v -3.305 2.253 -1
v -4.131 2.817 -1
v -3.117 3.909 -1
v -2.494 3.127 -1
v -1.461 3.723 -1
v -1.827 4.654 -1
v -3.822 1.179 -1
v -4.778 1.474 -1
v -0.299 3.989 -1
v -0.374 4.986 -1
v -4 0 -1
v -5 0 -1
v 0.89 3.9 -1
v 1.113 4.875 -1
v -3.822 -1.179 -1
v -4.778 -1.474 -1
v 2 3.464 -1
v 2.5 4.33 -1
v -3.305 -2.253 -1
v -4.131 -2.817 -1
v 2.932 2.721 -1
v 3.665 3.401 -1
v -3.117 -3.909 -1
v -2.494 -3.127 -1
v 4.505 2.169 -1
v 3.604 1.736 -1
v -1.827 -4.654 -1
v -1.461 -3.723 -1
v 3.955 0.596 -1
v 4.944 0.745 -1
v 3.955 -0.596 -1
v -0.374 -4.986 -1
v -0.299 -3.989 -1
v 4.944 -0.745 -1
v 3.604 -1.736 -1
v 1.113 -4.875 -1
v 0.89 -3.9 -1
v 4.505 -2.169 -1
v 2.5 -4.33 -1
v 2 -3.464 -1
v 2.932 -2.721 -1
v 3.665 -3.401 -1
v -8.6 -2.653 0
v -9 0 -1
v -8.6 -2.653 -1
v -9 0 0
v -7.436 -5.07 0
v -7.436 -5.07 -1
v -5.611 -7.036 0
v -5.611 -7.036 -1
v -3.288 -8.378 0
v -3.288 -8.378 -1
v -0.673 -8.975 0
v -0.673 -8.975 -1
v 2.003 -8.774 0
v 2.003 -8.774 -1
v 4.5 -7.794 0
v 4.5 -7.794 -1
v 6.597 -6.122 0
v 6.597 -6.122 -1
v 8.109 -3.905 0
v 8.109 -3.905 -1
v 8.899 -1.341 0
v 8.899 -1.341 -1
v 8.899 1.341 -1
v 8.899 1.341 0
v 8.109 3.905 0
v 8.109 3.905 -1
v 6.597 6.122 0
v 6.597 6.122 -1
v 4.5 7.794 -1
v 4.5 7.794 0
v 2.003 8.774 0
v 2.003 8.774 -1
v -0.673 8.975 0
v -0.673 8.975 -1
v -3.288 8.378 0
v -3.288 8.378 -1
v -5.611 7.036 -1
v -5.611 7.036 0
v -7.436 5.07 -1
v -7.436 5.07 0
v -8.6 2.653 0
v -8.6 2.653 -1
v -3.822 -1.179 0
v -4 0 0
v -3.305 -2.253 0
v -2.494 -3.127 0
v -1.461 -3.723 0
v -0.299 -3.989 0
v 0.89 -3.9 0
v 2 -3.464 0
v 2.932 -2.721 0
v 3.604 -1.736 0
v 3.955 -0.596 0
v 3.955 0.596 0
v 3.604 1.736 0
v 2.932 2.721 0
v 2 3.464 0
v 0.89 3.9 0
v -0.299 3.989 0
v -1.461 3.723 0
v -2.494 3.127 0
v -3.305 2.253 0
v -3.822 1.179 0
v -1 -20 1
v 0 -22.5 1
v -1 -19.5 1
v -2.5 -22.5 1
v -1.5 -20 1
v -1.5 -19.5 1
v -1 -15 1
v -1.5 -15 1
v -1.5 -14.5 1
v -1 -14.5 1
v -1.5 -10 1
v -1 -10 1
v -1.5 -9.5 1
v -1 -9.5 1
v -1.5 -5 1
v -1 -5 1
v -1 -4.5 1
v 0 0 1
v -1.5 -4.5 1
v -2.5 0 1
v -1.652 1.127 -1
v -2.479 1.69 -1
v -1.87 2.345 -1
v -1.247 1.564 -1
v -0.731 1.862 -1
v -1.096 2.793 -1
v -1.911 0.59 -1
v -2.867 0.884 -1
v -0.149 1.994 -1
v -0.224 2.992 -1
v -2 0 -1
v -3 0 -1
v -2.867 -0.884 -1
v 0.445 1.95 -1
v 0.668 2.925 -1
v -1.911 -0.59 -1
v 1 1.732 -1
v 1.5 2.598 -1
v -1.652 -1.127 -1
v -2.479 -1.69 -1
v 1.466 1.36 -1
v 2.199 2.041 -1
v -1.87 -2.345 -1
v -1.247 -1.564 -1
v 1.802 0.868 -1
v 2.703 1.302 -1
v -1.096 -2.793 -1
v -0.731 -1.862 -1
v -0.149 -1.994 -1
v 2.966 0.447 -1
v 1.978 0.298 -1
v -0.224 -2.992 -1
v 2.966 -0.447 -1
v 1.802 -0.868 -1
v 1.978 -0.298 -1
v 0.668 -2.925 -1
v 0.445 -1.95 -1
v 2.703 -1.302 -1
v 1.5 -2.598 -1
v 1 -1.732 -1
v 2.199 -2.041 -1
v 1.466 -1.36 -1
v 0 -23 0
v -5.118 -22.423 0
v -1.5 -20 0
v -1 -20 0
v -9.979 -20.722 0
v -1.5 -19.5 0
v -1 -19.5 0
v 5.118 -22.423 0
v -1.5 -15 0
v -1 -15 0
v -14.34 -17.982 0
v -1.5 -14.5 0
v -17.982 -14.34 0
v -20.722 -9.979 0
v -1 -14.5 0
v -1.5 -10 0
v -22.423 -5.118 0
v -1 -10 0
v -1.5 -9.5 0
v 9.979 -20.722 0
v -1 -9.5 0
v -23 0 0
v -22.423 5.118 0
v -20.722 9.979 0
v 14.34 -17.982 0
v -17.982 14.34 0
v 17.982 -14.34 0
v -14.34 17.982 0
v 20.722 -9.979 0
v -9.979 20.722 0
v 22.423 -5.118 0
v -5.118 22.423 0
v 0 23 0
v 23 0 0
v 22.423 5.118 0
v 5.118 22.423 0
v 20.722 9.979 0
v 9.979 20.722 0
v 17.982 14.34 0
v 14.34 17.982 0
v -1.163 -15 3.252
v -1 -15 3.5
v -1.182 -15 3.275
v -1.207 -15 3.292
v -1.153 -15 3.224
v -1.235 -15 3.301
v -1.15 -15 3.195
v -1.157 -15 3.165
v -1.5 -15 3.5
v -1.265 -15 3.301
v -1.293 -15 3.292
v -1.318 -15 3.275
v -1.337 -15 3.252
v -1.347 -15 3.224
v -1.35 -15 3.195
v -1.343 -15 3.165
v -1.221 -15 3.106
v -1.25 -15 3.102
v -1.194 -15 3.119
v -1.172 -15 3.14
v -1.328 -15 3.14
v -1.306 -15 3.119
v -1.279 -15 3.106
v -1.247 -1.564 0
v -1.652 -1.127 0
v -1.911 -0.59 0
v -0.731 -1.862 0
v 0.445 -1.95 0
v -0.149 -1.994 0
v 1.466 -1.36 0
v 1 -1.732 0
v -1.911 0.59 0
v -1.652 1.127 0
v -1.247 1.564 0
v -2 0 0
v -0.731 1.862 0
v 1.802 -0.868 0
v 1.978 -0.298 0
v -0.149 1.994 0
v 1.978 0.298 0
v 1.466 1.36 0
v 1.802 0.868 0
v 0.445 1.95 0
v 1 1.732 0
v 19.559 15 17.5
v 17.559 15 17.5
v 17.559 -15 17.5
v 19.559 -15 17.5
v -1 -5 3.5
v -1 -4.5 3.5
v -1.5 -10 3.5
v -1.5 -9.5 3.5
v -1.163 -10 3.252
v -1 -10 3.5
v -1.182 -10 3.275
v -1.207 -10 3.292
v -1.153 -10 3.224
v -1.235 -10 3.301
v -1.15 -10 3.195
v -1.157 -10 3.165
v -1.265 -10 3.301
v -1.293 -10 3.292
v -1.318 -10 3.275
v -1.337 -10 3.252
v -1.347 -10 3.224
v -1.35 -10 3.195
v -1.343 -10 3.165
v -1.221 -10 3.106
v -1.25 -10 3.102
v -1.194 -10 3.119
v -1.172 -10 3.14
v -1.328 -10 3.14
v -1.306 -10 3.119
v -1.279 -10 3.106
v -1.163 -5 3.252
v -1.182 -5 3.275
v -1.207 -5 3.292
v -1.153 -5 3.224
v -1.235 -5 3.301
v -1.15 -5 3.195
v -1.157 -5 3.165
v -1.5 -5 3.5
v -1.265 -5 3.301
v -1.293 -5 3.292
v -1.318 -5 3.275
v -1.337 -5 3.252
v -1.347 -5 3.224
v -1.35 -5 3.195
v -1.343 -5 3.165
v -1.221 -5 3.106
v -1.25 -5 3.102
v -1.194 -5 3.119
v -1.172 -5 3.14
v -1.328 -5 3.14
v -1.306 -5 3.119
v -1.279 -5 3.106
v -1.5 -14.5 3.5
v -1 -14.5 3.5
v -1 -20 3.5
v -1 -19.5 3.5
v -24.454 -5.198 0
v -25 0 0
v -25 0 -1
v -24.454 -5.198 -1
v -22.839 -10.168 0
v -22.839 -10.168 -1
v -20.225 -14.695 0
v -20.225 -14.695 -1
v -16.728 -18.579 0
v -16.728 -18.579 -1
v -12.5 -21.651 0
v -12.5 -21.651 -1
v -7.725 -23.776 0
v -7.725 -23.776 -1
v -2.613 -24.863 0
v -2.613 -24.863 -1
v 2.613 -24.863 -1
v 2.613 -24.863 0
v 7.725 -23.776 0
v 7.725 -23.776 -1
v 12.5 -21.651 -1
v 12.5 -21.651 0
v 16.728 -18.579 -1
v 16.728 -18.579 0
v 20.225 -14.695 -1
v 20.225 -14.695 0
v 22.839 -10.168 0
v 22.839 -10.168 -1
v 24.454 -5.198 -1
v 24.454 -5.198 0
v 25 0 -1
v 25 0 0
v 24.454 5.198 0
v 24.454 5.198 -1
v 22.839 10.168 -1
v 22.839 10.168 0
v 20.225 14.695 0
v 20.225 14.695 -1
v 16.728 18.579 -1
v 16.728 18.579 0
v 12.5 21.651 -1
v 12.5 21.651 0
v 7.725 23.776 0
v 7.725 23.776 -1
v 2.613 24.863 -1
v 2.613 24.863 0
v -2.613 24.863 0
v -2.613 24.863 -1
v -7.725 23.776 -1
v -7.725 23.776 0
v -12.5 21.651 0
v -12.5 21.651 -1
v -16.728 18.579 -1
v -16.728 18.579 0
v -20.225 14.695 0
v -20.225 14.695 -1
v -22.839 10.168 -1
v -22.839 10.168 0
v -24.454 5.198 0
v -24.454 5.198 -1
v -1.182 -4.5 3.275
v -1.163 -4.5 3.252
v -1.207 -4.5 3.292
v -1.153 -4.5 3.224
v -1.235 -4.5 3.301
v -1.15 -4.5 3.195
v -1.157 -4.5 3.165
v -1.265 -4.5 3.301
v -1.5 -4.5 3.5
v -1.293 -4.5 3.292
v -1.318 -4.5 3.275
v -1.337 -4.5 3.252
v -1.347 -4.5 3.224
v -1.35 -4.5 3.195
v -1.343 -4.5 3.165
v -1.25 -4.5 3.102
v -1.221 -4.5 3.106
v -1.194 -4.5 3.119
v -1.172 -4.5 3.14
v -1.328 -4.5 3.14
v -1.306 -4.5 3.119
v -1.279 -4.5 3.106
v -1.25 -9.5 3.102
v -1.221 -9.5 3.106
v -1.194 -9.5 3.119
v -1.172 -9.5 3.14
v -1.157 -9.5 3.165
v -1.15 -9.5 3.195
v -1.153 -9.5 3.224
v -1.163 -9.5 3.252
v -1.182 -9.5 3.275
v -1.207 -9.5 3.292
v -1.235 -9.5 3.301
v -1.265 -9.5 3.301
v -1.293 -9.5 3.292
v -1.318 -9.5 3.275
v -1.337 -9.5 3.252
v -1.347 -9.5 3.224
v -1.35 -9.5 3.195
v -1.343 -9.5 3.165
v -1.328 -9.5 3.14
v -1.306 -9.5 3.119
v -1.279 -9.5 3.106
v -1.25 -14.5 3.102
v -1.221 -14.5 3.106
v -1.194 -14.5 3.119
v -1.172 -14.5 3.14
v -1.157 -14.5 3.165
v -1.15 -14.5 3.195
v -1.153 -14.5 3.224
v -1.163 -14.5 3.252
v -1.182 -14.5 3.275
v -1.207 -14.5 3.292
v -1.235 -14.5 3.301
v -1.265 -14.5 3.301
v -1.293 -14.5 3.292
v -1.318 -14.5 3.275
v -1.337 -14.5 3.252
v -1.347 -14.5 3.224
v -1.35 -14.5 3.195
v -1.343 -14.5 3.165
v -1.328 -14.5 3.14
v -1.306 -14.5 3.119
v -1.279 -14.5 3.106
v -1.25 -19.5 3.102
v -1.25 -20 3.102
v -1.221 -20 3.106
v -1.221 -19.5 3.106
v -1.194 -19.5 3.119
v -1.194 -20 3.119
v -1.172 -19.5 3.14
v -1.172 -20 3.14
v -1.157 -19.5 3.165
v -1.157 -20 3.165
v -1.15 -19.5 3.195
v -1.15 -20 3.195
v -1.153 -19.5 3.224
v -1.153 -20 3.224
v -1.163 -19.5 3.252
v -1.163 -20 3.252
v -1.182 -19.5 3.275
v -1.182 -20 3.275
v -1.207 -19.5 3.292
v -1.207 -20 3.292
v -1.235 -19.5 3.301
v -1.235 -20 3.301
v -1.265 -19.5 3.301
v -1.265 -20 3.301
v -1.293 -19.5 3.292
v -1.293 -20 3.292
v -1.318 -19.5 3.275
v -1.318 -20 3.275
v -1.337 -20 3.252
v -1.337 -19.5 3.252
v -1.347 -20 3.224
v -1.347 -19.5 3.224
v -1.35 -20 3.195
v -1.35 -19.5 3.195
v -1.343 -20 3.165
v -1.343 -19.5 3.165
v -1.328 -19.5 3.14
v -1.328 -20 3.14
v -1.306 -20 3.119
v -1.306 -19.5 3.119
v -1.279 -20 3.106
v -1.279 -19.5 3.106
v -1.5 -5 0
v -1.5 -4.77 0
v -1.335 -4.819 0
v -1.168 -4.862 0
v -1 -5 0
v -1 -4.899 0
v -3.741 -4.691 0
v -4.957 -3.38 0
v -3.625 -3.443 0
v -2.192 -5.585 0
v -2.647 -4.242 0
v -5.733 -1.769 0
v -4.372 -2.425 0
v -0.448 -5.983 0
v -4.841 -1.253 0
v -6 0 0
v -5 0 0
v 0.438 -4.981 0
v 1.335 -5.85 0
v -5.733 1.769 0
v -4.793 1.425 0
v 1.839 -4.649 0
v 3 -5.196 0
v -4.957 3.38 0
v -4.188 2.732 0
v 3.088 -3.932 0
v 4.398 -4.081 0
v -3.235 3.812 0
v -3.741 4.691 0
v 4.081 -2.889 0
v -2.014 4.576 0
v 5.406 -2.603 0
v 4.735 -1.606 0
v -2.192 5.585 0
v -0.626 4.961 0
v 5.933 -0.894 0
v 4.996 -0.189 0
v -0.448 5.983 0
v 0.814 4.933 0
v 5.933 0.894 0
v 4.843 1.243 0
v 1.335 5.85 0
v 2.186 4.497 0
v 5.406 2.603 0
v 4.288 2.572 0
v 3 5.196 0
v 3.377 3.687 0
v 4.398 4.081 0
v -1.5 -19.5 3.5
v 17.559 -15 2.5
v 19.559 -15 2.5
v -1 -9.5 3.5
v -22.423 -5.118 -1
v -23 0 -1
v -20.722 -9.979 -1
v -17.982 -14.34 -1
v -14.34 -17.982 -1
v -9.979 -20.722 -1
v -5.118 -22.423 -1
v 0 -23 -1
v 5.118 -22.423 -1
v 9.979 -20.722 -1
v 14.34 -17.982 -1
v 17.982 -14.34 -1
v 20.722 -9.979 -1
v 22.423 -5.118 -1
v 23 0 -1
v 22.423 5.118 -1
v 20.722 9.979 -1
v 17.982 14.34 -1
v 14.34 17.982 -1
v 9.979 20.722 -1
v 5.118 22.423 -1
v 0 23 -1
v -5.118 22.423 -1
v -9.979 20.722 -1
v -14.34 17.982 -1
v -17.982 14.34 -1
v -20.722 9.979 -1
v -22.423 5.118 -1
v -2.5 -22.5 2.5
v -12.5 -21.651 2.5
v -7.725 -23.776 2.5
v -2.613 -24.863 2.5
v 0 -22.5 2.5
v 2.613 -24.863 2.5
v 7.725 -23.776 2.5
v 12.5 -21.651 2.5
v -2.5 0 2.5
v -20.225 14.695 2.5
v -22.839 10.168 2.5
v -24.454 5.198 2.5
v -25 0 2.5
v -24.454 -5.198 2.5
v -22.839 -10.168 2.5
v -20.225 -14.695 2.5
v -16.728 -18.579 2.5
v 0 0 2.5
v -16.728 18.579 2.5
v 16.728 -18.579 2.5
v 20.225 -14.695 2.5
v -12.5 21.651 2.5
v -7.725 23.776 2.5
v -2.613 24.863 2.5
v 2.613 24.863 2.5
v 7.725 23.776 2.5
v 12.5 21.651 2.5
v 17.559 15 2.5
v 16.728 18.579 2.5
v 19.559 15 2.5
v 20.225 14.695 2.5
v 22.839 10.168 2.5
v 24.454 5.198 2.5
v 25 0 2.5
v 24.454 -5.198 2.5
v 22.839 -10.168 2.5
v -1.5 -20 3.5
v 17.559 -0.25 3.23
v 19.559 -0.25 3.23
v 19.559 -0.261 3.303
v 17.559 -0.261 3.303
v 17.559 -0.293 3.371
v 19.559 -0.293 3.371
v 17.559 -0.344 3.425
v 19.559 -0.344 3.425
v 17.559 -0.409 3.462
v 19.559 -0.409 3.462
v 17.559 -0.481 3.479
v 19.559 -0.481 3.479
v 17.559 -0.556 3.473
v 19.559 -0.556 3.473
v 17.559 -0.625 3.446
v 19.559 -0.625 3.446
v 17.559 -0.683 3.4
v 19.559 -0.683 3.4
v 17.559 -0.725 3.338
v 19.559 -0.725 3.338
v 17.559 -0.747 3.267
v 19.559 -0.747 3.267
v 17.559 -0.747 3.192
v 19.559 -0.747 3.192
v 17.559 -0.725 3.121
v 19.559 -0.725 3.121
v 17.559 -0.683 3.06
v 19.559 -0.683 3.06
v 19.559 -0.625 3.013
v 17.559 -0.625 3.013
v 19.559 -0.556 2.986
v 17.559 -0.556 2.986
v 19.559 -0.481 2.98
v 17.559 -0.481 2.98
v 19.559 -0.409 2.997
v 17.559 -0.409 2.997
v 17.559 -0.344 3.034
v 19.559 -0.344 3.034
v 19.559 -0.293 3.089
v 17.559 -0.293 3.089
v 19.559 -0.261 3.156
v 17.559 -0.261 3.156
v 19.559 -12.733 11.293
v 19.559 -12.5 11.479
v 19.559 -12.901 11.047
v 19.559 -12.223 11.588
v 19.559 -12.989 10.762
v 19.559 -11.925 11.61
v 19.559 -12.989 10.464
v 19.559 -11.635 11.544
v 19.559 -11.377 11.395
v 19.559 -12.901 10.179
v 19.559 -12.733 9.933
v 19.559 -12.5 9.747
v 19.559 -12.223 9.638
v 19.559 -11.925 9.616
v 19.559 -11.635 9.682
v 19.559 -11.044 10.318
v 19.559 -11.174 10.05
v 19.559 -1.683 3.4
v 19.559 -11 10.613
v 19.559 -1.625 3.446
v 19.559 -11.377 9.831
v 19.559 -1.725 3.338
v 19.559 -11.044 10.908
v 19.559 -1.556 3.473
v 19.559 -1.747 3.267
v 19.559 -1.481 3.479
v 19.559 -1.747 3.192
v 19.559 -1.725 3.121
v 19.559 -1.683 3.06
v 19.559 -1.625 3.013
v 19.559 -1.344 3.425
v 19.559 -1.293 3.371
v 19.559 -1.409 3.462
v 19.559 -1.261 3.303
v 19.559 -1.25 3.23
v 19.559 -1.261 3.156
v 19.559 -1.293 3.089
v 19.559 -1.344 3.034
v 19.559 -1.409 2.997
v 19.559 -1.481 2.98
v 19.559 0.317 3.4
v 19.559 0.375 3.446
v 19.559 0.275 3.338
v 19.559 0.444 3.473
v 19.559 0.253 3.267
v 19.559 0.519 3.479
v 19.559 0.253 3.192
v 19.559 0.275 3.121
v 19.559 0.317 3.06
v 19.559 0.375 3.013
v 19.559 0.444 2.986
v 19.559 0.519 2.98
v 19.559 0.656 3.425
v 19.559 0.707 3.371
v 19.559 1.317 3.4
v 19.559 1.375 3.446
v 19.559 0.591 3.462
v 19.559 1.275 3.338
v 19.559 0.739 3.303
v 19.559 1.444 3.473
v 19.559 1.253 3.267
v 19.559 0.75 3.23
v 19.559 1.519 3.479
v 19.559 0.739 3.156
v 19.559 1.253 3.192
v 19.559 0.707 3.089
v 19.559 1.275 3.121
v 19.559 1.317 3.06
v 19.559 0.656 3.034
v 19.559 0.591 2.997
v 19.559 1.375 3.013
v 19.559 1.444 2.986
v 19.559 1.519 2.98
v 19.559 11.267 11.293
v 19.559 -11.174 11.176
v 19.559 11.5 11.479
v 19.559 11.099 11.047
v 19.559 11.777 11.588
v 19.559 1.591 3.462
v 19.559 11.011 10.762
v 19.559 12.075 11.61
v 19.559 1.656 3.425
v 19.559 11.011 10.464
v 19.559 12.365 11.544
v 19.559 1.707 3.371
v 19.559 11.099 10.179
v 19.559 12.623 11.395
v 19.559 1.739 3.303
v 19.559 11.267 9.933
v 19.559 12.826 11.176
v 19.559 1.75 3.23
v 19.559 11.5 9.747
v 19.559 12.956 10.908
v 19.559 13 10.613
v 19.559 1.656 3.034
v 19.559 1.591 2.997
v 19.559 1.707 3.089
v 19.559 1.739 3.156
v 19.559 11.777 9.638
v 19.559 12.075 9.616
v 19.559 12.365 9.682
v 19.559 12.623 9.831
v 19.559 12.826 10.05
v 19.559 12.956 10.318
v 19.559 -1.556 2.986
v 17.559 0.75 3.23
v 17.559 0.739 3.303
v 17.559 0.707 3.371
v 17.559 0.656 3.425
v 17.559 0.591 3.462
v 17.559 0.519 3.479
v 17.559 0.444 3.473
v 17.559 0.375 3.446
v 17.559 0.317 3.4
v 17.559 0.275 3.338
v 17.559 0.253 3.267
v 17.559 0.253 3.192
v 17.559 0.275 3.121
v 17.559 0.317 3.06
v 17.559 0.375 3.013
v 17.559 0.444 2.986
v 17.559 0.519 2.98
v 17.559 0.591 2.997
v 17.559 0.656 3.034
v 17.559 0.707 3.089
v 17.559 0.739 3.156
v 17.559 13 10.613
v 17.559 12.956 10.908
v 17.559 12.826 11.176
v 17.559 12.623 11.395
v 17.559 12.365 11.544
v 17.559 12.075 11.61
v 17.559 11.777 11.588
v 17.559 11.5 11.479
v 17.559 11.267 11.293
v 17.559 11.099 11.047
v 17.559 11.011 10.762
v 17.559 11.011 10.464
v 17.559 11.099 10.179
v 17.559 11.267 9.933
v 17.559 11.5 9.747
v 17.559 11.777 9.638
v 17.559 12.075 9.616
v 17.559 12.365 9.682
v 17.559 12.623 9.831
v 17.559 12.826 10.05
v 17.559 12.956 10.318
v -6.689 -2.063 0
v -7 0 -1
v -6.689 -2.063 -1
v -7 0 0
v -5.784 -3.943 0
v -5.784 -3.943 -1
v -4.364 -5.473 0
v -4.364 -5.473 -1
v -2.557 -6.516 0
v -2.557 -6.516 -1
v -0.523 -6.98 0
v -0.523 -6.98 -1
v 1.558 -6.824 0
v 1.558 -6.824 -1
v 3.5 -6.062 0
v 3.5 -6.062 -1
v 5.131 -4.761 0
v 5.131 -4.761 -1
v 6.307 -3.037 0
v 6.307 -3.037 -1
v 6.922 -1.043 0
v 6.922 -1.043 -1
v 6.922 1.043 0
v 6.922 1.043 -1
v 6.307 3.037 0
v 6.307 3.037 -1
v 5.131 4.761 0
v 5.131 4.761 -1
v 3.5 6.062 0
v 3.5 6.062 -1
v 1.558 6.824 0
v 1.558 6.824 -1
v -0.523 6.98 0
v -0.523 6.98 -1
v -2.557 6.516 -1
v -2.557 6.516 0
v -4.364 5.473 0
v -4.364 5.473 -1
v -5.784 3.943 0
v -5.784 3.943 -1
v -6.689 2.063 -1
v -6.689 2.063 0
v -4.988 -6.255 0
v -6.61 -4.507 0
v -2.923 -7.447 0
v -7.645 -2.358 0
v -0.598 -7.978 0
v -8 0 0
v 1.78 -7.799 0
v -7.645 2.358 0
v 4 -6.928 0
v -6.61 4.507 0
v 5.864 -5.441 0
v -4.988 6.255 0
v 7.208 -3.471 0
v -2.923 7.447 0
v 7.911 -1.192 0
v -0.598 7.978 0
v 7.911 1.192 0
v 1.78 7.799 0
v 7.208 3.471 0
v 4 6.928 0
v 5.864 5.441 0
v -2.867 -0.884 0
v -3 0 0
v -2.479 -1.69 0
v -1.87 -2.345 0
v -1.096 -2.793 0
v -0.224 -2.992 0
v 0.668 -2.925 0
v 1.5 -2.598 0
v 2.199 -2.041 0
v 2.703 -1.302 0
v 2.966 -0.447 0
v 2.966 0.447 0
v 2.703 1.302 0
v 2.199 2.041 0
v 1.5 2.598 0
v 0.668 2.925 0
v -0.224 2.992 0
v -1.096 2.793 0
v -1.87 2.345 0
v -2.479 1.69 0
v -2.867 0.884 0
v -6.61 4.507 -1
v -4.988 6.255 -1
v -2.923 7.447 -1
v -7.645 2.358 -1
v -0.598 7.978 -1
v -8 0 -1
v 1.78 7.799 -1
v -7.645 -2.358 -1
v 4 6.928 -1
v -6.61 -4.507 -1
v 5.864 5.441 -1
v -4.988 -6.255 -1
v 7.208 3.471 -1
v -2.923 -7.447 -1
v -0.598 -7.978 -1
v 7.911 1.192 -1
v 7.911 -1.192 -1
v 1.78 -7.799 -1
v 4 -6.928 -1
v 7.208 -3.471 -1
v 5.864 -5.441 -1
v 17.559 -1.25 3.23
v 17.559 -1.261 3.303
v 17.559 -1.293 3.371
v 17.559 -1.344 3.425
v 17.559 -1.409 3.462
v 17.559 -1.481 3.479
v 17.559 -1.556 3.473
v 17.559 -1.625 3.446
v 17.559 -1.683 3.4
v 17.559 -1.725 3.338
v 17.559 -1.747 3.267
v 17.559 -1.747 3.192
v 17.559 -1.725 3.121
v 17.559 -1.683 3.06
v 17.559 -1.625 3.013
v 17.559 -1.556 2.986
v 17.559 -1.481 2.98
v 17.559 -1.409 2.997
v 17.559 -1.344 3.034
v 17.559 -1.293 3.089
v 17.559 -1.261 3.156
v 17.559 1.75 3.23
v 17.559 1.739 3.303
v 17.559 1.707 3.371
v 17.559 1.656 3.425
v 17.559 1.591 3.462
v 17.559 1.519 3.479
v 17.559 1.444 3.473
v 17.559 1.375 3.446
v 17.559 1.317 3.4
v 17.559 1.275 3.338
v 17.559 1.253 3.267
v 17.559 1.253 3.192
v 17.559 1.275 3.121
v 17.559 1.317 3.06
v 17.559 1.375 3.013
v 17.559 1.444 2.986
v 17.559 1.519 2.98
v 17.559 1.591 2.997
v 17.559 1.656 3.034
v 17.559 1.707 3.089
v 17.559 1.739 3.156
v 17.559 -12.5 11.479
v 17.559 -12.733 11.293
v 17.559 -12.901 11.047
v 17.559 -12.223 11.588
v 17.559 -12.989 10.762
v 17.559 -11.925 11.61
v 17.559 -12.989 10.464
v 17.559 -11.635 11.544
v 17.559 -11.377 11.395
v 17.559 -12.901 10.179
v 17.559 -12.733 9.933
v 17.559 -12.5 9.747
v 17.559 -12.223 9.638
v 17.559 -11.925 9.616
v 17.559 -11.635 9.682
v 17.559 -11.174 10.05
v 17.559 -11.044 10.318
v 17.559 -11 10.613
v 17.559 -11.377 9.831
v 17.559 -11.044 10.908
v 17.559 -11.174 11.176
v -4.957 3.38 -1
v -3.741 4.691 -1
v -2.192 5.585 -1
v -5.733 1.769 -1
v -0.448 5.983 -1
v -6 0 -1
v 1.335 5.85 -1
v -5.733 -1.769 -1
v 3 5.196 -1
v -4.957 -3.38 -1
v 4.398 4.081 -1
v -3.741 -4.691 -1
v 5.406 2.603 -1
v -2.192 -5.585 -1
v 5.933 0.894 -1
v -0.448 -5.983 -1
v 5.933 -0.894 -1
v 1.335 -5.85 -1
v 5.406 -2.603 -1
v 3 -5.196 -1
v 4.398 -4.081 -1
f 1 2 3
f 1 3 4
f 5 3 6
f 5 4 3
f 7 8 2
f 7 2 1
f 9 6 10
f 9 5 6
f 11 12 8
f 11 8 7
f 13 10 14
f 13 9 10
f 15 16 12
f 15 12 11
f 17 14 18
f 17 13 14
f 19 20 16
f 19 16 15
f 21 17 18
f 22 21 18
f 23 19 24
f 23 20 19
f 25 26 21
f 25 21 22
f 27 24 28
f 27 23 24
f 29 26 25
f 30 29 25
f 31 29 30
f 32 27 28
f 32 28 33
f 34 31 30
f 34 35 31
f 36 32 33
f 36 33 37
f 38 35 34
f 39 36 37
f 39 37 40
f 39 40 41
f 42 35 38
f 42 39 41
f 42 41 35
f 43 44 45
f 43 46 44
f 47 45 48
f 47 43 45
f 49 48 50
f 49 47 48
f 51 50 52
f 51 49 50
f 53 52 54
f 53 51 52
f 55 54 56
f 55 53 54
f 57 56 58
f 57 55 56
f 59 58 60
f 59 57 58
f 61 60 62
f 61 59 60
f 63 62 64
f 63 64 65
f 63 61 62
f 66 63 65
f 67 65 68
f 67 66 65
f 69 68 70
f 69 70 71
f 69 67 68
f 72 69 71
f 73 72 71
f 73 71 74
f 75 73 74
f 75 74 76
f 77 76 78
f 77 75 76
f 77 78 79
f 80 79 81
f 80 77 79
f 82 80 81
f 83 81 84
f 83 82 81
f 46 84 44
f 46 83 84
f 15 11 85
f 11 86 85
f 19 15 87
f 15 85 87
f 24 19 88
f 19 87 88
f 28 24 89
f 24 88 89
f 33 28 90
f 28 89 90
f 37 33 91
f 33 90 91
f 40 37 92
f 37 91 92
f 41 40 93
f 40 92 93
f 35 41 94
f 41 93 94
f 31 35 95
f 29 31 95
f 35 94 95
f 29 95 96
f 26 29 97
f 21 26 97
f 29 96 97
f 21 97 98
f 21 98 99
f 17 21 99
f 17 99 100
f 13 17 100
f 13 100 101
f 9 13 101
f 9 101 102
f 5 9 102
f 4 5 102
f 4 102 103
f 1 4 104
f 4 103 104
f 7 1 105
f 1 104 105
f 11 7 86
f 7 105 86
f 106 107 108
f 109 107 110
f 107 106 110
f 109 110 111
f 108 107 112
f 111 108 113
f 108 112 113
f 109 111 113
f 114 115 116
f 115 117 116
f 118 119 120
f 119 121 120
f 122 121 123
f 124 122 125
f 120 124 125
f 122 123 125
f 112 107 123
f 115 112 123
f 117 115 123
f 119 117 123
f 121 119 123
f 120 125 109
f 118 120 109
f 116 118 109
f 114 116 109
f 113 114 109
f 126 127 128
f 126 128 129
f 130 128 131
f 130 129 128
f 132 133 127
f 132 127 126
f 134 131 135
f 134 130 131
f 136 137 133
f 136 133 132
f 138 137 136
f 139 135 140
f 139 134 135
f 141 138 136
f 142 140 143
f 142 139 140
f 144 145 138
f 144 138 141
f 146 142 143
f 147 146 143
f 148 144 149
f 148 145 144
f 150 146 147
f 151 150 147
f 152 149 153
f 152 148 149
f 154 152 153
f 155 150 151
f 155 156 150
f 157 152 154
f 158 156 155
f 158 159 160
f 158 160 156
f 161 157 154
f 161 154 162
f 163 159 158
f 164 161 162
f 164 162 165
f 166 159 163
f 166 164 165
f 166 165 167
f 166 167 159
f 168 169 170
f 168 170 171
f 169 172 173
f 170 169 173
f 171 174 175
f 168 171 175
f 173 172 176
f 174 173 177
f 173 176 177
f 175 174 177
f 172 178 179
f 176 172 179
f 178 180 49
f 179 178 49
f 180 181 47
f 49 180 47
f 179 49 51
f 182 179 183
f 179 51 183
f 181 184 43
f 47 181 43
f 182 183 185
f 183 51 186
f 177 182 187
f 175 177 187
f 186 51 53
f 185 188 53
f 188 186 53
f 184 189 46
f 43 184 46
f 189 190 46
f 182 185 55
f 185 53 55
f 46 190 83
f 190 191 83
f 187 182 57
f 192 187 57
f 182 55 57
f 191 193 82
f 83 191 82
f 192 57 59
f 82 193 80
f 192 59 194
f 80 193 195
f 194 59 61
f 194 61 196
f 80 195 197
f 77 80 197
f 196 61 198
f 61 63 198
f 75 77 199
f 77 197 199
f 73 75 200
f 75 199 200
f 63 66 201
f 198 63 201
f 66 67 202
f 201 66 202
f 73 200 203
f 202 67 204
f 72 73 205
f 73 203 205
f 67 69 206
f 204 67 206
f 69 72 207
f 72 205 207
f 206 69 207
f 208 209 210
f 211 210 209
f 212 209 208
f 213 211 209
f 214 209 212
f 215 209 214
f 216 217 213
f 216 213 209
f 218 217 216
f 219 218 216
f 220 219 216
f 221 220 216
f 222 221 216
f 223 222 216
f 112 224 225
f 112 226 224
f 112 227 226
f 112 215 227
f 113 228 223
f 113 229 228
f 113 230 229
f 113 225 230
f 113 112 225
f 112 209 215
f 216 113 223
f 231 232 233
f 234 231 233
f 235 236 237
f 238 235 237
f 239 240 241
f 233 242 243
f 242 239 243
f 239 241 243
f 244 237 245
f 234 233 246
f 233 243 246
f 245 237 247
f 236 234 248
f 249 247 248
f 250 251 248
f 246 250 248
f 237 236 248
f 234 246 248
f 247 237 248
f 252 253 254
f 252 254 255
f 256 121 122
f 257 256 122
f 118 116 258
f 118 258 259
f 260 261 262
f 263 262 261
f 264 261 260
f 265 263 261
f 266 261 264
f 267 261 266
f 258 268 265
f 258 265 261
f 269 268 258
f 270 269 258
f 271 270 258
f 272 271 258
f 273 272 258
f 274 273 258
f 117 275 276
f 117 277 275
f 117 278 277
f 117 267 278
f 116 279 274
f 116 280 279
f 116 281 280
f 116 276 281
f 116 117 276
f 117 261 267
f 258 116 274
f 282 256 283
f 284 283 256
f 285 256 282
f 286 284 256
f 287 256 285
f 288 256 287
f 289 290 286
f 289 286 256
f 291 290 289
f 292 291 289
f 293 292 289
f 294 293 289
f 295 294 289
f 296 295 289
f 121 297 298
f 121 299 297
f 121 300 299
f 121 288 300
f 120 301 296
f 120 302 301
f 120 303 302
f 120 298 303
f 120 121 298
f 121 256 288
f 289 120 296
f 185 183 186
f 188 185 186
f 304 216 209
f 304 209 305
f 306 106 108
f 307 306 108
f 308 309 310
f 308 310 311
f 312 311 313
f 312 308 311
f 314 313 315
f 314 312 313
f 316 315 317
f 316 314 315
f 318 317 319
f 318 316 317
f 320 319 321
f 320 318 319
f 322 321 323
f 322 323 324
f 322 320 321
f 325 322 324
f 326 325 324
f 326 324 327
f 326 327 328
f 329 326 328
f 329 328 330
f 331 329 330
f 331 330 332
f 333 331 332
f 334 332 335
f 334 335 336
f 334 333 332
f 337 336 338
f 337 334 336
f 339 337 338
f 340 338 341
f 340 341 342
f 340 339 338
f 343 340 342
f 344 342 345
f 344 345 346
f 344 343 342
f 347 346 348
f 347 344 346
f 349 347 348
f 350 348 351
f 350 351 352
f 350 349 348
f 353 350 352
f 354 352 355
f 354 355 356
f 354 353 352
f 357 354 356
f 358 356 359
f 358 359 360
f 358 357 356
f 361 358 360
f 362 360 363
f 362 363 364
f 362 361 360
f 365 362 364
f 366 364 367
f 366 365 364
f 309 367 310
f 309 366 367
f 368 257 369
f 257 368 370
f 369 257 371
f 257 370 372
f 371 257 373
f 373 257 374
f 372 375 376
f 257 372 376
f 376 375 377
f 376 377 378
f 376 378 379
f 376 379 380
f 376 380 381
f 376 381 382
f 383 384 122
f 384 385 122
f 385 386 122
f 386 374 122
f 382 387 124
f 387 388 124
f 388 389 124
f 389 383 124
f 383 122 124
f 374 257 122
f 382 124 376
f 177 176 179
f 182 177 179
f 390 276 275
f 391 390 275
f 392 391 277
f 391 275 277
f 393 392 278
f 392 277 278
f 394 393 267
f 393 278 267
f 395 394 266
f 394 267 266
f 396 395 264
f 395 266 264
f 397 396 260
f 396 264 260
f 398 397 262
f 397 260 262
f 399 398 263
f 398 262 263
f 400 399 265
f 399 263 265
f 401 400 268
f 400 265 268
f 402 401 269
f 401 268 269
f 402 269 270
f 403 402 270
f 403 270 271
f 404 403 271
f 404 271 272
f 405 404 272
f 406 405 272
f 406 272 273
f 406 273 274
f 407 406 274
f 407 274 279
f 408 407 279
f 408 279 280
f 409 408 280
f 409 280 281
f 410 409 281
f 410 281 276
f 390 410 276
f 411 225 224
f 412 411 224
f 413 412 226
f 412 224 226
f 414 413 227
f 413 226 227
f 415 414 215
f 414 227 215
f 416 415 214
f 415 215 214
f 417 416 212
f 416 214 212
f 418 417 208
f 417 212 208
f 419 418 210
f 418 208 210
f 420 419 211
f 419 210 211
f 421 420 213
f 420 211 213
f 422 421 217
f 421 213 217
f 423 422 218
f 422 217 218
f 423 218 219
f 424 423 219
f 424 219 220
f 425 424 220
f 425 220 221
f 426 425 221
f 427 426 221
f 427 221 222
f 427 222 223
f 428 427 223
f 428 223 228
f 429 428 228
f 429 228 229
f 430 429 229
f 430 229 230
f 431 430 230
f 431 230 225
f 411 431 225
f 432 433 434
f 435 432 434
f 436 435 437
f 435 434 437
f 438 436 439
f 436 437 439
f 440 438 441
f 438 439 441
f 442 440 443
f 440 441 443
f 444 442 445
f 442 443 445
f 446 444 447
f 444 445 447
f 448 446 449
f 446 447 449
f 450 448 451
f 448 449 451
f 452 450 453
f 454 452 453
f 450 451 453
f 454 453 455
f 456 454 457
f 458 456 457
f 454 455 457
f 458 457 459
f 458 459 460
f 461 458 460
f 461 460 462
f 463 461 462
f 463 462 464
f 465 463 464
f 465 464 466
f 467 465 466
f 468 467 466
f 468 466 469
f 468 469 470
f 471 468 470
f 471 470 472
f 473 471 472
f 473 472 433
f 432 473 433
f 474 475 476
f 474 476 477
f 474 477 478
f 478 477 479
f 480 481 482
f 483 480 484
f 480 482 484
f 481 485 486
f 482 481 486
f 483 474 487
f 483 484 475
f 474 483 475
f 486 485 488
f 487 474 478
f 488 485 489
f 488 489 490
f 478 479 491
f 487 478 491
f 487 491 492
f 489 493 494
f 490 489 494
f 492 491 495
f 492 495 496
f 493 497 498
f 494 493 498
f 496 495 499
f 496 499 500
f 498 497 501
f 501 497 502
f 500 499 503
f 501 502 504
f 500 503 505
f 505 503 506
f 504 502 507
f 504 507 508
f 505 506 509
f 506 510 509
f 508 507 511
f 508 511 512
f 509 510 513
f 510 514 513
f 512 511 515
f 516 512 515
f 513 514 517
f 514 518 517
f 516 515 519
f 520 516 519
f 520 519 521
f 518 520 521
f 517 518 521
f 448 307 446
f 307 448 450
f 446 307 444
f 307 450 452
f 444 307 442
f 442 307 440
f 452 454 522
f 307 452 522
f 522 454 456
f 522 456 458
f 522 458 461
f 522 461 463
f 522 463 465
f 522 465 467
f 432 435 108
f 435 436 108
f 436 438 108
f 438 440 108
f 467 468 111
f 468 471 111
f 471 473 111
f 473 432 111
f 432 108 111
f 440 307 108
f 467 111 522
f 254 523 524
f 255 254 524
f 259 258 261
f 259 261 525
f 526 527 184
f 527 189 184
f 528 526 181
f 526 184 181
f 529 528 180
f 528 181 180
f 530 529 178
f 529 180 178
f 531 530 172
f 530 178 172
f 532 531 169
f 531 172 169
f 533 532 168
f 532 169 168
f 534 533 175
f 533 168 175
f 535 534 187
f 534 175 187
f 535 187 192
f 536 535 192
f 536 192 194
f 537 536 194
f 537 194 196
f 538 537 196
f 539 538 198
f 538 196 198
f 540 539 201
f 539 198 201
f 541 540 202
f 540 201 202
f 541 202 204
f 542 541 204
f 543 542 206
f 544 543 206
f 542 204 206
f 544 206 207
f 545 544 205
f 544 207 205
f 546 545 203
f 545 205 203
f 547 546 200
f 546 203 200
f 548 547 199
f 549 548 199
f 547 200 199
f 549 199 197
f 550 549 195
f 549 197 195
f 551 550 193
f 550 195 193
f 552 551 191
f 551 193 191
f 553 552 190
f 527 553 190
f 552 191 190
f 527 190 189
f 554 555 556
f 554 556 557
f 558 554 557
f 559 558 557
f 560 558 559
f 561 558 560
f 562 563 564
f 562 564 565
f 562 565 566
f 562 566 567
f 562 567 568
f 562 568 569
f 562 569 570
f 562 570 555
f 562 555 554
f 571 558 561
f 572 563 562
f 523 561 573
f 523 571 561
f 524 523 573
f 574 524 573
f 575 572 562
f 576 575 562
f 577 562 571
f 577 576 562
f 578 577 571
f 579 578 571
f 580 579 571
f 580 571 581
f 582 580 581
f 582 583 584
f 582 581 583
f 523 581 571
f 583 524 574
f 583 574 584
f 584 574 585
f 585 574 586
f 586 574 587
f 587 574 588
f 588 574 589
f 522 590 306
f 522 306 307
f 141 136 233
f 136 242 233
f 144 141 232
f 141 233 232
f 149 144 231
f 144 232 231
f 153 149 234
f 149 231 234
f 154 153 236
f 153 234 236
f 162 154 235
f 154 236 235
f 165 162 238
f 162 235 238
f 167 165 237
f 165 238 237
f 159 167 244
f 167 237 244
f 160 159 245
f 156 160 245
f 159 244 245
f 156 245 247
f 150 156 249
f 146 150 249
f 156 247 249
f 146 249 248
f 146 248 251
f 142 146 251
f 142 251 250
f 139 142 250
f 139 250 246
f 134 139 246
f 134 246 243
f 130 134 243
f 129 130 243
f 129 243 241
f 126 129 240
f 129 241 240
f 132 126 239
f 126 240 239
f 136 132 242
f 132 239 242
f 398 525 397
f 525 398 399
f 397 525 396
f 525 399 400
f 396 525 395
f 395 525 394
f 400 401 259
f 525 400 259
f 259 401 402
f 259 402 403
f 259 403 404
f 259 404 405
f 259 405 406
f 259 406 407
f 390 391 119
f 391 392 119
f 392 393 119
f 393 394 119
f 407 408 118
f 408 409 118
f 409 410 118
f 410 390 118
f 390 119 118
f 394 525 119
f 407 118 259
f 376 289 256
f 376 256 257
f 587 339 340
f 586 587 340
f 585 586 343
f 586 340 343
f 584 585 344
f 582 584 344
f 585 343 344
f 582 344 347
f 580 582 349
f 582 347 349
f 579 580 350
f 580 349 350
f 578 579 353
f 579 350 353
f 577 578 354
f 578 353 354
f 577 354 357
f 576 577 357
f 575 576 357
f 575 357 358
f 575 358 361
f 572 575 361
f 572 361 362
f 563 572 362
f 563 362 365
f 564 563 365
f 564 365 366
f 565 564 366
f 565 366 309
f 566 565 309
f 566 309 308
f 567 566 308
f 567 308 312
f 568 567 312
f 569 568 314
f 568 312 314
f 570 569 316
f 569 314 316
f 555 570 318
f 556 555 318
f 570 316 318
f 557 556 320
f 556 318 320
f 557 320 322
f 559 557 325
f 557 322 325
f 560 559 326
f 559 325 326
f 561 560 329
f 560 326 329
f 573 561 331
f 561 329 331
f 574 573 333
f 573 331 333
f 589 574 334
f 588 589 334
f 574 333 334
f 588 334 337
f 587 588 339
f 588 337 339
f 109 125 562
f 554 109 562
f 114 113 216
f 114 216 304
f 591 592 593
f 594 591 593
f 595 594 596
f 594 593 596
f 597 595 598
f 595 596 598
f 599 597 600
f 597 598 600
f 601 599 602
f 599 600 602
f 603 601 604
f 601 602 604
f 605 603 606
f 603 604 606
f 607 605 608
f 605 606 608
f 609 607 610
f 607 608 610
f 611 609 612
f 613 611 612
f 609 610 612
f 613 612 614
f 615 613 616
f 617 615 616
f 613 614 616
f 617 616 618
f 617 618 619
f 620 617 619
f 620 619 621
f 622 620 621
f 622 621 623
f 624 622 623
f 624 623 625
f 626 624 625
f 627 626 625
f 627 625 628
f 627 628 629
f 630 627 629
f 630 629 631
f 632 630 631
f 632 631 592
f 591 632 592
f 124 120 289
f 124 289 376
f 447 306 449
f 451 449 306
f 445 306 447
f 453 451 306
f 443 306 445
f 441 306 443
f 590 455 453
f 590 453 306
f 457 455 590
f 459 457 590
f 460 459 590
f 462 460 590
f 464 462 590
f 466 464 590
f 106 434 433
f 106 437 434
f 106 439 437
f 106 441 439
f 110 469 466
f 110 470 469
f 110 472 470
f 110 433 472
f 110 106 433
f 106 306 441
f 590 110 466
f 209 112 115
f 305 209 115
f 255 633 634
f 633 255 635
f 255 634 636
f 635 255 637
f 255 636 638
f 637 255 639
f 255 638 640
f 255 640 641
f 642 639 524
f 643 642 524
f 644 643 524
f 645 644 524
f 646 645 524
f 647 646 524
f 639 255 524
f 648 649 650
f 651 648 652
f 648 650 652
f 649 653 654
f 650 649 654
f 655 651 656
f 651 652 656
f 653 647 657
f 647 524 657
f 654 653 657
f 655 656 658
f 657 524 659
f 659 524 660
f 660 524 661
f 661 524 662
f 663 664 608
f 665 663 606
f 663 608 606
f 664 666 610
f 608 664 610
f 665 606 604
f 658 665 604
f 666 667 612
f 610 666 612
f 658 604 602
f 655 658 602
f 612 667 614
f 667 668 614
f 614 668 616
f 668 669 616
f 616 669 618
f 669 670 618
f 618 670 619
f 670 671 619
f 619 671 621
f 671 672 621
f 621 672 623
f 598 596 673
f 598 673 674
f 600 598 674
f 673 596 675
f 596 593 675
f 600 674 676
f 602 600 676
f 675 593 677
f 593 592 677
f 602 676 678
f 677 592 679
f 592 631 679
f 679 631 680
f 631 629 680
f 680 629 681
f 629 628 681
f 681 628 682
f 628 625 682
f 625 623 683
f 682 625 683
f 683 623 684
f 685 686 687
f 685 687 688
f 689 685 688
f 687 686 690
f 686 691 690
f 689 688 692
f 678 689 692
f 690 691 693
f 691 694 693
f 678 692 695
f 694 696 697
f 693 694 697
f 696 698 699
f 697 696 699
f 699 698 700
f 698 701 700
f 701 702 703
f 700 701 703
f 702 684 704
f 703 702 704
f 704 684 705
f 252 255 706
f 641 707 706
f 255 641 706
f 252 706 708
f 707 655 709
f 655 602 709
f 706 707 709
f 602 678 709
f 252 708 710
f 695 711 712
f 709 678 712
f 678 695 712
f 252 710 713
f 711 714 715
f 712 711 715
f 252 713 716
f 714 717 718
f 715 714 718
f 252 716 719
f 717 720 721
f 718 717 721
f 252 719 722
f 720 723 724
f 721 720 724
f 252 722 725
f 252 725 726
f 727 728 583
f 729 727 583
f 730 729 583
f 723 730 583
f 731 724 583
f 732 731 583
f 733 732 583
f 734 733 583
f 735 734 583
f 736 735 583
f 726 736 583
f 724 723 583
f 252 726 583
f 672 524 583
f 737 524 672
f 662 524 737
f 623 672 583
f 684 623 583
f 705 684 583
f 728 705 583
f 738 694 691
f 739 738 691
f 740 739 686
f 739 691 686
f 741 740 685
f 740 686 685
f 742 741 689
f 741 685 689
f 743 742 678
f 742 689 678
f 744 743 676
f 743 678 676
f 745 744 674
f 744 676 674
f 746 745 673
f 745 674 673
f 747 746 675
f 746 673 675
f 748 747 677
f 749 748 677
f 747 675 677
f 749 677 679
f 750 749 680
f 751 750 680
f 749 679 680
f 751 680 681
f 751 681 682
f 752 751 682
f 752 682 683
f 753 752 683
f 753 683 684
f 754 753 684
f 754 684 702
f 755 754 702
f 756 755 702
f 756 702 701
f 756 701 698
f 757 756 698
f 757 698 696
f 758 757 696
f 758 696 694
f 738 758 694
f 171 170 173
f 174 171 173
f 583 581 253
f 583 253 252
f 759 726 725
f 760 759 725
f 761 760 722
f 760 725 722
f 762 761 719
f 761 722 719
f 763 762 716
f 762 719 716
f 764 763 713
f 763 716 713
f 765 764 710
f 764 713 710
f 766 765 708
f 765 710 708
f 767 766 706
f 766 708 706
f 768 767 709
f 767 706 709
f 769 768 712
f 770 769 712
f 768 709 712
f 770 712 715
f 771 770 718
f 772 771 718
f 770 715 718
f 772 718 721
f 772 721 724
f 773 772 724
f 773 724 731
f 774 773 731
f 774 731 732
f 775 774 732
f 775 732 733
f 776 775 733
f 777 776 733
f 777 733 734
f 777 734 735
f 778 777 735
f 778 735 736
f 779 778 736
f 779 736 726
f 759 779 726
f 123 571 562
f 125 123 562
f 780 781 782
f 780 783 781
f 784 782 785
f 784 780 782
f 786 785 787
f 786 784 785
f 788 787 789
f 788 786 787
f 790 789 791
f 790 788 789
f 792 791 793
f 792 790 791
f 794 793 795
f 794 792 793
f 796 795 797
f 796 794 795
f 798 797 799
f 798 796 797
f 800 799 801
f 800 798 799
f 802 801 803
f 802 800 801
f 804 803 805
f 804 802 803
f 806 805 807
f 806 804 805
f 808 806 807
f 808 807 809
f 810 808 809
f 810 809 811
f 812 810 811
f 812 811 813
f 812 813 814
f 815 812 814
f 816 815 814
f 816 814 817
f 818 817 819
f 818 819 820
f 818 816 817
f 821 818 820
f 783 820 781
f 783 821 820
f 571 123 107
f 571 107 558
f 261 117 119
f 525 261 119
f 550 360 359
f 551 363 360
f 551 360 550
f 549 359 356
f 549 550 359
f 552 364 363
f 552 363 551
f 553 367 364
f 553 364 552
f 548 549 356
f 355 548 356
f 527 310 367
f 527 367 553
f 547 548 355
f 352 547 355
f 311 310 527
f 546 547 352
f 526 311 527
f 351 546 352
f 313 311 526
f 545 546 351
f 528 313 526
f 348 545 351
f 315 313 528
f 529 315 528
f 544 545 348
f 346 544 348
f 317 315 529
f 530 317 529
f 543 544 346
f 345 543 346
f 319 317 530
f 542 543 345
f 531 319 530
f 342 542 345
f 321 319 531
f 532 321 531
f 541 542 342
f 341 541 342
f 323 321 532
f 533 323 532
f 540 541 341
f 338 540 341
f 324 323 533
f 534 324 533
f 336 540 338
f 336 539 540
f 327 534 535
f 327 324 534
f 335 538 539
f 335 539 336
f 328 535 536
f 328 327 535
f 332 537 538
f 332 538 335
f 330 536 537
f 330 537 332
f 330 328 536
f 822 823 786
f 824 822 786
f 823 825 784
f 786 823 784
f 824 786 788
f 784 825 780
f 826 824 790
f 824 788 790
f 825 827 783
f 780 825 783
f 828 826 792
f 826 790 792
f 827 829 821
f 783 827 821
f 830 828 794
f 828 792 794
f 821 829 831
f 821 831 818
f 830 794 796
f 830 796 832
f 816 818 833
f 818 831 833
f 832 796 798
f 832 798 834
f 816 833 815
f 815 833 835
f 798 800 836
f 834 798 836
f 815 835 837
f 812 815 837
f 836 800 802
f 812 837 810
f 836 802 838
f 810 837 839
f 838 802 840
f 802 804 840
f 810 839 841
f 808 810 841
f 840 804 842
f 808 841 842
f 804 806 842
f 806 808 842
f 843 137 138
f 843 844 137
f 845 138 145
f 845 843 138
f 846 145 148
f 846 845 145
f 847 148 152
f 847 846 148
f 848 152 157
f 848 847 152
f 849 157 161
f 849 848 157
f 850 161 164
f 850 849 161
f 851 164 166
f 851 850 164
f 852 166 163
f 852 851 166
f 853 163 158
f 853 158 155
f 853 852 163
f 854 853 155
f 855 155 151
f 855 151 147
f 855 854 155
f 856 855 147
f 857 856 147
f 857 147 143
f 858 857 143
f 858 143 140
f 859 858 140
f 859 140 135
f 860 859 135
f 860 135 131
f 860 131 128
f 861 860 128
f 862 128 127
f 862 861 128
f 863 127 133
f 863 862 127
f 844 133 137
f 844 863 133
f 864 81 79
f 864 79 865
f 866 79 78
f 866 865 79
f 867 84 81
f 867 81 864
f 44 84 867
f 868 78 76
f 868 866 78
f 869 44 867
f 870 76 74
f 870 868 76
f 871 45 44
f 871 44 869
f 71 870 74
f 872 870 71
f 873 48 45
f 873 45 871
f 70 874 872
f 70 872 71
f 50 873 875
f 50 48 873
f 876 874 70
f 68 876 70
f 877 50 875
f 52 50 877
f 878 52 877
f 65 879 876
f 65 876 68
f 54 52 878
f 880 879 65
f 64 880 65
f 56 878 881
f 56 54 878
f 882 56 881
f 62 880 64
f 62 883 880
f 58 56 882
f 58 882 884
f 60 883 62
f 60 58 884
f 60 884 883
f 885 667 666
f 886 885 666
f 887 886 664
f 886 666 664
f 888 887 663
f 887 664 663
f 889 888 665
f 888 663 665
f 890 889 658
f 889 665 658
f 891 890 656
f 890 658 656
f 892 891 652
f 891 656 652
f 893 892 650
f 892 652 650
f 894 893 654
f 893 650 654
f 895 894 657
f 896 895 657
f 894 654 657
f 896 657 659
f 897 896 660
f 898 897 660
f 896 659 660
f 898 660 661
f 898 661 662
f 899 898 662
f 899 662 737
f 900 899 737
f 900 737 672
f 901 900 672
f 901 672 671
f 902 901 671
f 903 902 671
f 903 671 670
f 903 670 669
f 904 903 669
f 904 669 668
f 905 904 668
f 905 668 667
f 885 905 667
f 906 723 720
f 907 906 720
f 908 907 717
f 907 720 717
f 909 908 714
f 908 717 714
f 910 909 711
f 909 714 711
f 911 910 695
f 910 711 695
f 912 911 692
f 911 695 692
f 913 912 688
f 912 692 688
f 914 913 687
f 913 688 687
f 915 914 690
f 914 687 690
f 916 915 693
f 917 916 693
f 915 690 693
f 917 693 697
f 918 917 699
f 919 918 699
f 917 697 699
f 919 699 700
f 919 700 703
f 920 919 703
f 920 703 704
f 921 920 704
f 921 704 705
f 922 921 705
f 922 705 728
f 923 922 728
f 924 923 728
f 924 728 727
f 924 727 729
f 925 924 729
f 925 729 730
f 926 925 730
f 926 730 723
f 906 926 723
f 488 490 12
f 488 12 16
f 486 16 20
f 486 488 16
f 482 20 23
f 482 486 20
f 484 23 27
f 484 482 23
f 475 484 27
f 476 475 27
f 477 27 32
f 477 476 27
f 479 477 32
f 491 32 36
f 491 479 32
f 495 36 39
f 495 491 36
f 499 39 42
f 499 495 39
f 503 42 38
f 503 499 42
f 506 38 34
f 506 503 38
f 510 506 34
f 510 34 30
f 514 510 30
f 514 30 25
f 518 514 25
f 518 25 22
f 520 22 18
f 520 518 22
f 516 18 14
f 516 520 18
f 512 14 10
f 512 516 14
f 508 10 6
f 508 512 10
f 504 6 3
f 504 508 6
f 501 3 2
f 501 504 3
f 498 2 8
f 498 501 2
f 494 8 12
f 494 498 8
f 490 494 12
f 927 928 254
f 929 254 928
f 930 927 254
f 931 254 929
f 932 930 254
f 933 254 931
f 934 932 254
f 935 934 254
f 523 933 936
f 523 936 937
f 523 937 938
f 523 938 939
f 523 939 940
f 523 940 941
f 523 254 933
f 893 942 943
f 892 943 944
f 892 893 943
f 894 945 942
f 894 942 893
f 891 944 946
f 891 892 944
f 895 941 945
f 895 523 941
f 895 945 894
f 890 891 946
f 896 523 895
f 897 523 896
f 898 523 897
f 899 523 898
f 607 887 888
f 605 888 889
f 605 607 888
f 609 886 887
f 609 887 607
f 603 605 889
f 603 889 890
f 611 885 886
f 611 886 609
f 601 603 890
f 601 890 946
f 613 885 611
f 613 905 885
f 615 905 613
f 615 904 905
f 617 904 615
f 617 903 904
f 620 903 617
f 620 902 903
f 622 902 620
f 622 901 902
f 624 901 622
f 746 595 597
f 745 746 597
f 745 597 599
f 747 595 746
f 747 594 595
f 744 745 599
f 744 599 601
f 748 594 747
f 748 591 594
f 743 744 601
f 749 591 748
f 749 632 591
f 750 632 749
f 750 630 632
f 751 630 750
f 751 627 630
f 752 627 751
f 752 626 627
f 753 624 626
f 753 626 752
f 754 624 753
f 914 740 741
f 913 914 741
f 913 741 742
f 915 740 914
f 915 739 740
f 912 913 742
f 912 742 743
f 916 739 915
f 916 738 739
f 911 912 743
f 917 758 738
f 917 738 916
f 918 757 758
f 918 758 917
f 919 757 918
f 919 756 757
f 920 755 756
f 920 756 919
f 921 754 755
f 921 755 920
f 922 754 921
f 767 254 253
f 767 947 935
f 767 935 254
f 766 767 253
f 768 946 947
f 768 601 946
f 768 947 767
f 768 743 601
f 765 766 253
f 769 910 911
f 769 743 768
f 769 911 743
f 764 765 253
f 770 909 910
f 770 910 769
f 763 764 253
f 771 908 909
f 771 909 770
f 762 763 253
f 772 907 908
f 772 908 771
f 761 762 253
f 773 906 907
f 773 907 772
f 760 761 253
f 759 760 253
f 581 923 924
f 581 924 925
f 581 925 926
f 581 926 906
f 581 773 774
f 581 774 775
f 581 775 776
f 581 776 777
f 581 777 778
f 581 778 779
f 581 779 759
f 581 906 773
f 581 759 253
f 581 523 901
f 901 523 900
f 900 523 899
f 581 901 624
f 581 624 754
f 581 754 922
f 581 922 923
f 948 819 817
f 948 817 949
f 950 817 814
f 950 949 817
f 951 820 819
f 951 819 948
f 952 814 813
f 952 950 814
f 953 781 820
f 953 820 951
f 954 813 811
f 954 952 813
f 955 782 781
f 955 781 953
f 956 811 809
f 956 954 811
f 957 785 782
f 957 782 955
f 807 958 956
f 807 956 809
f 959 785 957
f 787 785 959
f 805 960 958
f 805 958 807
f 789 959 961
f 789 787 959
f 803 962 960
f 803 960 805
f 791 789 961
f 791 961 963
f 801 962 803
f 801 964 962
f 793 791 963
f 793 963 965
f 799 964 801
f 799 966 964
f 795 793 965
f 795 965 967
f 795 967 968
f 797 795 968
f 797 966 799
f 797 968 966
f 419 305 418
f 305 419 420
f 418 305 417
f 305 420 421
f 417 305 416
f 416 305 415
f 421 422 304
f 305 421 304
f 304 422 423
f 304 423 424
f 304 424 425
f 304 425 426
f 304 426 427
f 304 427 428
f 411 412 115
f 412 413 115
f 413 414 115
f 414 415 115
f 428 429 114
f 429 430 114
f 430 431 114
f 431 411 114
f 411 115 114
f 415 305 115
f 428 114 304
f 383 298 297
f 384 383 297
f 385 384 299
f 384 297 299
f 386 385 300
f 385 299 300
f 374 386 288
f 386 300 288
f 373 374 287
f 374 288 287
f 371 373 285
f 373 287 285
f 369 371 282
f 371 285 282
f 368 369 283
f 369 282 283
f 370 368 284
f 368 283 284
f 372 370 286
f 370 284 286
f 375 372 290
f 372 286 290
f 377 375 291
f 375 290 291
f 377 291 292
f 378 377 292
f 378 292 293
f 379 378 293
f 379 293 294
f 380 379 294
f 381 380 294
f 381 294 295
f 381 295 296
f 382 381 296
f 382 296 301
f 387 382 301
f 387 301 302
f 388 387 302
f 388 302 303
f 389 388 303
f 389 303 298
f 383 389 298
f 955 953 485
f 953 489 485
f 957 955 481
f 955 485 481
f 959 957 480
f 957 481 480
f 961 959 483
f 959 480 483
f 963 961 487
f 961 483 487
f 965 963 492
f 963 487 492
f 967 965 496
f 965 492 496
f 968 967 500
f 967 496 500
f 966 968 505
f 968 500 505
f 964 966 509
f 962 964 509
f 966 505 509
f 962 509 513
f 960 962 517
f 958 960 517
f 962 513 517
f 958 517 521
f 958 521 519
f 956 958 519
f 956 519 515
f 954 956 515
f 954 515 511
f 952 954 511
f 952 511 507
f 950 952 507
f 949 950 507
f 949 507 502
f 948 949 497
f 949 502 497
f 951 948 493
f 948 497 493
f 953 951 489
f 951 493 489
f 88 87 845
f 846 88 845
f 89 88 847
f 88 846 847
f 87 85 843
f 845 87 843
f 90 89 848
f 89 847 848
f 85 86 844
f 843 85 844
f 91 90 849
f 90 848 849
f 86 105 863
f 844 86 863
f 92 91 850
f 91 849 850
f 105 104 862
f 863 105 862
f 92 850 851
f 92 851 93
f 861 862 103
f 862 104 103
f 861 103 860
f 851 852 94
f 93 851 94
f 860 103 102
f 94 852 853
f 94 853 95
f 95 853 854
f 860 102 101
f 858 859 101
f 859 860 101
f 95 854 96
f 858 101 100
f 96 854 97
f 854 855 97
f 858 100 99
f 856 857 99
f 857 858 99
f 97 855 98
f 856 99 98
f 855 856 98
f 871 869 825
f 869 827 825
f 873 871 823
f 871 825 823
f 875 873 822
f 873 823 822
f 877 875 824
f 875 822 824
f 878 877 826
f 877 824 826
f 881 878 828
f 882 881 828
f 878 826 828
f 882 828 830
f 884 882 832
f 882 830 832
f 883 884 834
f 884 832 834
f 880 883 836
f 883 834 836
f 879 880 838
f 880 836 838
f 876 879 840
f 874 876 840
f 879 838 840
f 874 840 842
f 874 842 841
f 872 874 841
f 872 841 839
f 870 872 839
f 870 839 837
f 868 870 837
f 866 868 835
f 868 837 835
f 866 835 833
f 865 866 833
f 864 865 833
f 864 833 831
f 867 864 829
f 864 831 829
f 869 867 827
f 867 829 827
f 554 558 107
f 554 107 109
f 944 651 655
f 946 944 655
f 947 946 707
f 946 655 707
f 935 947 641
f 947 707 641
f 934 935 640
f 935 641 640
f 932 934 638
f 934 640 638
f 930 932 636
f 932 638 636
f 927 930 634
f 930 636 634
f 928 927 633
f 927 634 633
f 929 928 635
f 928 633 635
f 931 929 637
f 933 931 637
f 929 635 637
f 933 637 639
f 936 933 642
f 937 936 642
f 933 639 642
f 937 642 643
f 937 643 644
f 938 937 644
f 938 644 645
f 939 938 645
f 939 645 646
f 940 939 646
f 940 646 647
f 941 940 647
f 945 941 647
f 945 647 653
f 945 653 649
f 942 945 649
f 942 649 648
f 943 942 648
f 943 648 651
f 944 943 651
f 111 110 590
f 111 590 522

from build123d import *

# Parameters (mm, degrees)
SKETCH2_R           = 25
BOSS_EXTRUDE1_DEPTH = 2.5
SKETCH4_W           = 2.5
SKETCH4_H           = 2.726925283
CUT_EXTRUDE1_DEPTH  = 22.5
SKETCH8_W           = 1
SKETCH8_H           = 1
SKETCH8_W_2         = 2
SKETCH9_W           = 0.5
SKETCH9_H           = 0.5
BOSS_EXTRUDE3_DEPTH = 3.5
SKETCH10_R          = 0.1
CUT_EXTRUDE2_DEPTH  = 17.5
SKETCH11_W          = 2
SKETCH11_H          = 30
BOSS_EXTRUDE4_DEPTH = 15
SKETCH12_R          = 1
SKETCH12_R_2        = 0.25
CUT_EXTRUDE3_DEPTH  = 15


with BuildPart() as part:
    # Sketch2 → Boss-Extrude1 (new body)
    with BuildSketch(Plane(origin=(0, 0, 0), x_dir=(0, 1, 0), z_dir=(0, 0, 1))):
        Circle(SKETCH2_R)
    extrude(amount=BOSS_EXTRUDE1_DEPTH)

    # Sketch4 → Cut-Extrude1 (cut)
    with BuildSketch(Plane(origin=(0, 0, 0), x_dir=(-1, 0, 0), z_dir=(0, 1, 0))):
        with Locations((1.25, 2.363462641)):
            Rectangle(SKETCH4_W, SKETCH4_H)
    extrude(amount=-CUT_EXTRUDE1_DEPTH, mode=Mode.SUBTRACT)

    # Sketch8 → Revolve2 (revolve)
    with BuildSketch(Plane.YZ):
        with Locations((2.5, -0.5)):
            Rectangle(SKETCH8_W, SKETCH8_H)
        with Locations((4.5, -0.5)):
            Rectangle(SKETCH8_W, SKETCH8_H)
        with Locations((6.5, -0.5)):
            Rectangle(SKETCH8_W, SKETCH8_H)
        with Locations((8.5, -0.5)):
            Rectangle(SKETCH8_W, SKETCH8_H)
        with Locations((24, -0.5)):
            Rectangle(SKETCH8_W_2, SKETCH8_H)
    revolve(axis=Axis((0, 0, 0), (0, 0, 1)))

    # Sketch9 → Boss-Extrude3 (add)
    with BuildSketch(Plane(origin=(0, 0, 0), x_dir=(0, 1, 0), z_dir=(0, 0, 1))):
        with Locations((-4.75, 1.25)):
            Rectangle(SKETCH9_W, SKETCH9_H)
        with Locations((-9.75, 1.25)):
            Rectangle(SKETCH9_W, SKETCH9_H)
        with Locations((-14.75, 1.25)):
            Rectangle(SKETCH9_W, SKETCH9_H)
        with Locations((-19.75, 1.25)):
            Rectangle(SKETCH9_W, SKETCH9_H)
    extrude(amount=BOSS_EXTRUDE3_DEPTH)

    # Sketch10 → Cut-Extrude2 (cut)
    with BuildSketch(Plane.XZ.offset(20)):
        with Locations((-1.25, 3.202014363)):
            Circle(SKETCH10_R)
    extrude(amount=-CUT_EXTRUDE2_DEPTH, mode=Mode.SUBTRACT)

    # Sketch11 → Boss-Extrude4 (add)
    with BuildSketch(Plane.XY.offset(2.5)):
        with Locations((18.558520072, 0)):
            Rectangle(SKETCH11_W, SKETCH11_H)
    extrude(amount=BOSS_EXTRUDE4_DEPTH)

    # Sketch12 → Cut-Extrude3 (cut)
    with BuildSketch(Plane.YZ.offset(19.558520072)):
        with Locations((12, 10.613168665)):
            Circle(SKETCH12_R)
        with Locations((-12, 10.613168665)):
            Circle(SKETCH12_R)
        with Locations((0.5, 3.229684711)):
            Circle(SKETCH12_R_2)
        with Locations((1.5, 3.229684711)):
            Circle(SKETCH12_R_2)
        with Locations((-1.5, 3.229684711)):
            Circle(SKETCH12_R_2)
        with Locations((-0.5, 3.229684711)):
            Circle(SKETCH12_R_2)
    extrude(amount=-CUT_EXTRUDE3_DEPTH, mode=Mode.SUBTRACT)


solid = part.part
